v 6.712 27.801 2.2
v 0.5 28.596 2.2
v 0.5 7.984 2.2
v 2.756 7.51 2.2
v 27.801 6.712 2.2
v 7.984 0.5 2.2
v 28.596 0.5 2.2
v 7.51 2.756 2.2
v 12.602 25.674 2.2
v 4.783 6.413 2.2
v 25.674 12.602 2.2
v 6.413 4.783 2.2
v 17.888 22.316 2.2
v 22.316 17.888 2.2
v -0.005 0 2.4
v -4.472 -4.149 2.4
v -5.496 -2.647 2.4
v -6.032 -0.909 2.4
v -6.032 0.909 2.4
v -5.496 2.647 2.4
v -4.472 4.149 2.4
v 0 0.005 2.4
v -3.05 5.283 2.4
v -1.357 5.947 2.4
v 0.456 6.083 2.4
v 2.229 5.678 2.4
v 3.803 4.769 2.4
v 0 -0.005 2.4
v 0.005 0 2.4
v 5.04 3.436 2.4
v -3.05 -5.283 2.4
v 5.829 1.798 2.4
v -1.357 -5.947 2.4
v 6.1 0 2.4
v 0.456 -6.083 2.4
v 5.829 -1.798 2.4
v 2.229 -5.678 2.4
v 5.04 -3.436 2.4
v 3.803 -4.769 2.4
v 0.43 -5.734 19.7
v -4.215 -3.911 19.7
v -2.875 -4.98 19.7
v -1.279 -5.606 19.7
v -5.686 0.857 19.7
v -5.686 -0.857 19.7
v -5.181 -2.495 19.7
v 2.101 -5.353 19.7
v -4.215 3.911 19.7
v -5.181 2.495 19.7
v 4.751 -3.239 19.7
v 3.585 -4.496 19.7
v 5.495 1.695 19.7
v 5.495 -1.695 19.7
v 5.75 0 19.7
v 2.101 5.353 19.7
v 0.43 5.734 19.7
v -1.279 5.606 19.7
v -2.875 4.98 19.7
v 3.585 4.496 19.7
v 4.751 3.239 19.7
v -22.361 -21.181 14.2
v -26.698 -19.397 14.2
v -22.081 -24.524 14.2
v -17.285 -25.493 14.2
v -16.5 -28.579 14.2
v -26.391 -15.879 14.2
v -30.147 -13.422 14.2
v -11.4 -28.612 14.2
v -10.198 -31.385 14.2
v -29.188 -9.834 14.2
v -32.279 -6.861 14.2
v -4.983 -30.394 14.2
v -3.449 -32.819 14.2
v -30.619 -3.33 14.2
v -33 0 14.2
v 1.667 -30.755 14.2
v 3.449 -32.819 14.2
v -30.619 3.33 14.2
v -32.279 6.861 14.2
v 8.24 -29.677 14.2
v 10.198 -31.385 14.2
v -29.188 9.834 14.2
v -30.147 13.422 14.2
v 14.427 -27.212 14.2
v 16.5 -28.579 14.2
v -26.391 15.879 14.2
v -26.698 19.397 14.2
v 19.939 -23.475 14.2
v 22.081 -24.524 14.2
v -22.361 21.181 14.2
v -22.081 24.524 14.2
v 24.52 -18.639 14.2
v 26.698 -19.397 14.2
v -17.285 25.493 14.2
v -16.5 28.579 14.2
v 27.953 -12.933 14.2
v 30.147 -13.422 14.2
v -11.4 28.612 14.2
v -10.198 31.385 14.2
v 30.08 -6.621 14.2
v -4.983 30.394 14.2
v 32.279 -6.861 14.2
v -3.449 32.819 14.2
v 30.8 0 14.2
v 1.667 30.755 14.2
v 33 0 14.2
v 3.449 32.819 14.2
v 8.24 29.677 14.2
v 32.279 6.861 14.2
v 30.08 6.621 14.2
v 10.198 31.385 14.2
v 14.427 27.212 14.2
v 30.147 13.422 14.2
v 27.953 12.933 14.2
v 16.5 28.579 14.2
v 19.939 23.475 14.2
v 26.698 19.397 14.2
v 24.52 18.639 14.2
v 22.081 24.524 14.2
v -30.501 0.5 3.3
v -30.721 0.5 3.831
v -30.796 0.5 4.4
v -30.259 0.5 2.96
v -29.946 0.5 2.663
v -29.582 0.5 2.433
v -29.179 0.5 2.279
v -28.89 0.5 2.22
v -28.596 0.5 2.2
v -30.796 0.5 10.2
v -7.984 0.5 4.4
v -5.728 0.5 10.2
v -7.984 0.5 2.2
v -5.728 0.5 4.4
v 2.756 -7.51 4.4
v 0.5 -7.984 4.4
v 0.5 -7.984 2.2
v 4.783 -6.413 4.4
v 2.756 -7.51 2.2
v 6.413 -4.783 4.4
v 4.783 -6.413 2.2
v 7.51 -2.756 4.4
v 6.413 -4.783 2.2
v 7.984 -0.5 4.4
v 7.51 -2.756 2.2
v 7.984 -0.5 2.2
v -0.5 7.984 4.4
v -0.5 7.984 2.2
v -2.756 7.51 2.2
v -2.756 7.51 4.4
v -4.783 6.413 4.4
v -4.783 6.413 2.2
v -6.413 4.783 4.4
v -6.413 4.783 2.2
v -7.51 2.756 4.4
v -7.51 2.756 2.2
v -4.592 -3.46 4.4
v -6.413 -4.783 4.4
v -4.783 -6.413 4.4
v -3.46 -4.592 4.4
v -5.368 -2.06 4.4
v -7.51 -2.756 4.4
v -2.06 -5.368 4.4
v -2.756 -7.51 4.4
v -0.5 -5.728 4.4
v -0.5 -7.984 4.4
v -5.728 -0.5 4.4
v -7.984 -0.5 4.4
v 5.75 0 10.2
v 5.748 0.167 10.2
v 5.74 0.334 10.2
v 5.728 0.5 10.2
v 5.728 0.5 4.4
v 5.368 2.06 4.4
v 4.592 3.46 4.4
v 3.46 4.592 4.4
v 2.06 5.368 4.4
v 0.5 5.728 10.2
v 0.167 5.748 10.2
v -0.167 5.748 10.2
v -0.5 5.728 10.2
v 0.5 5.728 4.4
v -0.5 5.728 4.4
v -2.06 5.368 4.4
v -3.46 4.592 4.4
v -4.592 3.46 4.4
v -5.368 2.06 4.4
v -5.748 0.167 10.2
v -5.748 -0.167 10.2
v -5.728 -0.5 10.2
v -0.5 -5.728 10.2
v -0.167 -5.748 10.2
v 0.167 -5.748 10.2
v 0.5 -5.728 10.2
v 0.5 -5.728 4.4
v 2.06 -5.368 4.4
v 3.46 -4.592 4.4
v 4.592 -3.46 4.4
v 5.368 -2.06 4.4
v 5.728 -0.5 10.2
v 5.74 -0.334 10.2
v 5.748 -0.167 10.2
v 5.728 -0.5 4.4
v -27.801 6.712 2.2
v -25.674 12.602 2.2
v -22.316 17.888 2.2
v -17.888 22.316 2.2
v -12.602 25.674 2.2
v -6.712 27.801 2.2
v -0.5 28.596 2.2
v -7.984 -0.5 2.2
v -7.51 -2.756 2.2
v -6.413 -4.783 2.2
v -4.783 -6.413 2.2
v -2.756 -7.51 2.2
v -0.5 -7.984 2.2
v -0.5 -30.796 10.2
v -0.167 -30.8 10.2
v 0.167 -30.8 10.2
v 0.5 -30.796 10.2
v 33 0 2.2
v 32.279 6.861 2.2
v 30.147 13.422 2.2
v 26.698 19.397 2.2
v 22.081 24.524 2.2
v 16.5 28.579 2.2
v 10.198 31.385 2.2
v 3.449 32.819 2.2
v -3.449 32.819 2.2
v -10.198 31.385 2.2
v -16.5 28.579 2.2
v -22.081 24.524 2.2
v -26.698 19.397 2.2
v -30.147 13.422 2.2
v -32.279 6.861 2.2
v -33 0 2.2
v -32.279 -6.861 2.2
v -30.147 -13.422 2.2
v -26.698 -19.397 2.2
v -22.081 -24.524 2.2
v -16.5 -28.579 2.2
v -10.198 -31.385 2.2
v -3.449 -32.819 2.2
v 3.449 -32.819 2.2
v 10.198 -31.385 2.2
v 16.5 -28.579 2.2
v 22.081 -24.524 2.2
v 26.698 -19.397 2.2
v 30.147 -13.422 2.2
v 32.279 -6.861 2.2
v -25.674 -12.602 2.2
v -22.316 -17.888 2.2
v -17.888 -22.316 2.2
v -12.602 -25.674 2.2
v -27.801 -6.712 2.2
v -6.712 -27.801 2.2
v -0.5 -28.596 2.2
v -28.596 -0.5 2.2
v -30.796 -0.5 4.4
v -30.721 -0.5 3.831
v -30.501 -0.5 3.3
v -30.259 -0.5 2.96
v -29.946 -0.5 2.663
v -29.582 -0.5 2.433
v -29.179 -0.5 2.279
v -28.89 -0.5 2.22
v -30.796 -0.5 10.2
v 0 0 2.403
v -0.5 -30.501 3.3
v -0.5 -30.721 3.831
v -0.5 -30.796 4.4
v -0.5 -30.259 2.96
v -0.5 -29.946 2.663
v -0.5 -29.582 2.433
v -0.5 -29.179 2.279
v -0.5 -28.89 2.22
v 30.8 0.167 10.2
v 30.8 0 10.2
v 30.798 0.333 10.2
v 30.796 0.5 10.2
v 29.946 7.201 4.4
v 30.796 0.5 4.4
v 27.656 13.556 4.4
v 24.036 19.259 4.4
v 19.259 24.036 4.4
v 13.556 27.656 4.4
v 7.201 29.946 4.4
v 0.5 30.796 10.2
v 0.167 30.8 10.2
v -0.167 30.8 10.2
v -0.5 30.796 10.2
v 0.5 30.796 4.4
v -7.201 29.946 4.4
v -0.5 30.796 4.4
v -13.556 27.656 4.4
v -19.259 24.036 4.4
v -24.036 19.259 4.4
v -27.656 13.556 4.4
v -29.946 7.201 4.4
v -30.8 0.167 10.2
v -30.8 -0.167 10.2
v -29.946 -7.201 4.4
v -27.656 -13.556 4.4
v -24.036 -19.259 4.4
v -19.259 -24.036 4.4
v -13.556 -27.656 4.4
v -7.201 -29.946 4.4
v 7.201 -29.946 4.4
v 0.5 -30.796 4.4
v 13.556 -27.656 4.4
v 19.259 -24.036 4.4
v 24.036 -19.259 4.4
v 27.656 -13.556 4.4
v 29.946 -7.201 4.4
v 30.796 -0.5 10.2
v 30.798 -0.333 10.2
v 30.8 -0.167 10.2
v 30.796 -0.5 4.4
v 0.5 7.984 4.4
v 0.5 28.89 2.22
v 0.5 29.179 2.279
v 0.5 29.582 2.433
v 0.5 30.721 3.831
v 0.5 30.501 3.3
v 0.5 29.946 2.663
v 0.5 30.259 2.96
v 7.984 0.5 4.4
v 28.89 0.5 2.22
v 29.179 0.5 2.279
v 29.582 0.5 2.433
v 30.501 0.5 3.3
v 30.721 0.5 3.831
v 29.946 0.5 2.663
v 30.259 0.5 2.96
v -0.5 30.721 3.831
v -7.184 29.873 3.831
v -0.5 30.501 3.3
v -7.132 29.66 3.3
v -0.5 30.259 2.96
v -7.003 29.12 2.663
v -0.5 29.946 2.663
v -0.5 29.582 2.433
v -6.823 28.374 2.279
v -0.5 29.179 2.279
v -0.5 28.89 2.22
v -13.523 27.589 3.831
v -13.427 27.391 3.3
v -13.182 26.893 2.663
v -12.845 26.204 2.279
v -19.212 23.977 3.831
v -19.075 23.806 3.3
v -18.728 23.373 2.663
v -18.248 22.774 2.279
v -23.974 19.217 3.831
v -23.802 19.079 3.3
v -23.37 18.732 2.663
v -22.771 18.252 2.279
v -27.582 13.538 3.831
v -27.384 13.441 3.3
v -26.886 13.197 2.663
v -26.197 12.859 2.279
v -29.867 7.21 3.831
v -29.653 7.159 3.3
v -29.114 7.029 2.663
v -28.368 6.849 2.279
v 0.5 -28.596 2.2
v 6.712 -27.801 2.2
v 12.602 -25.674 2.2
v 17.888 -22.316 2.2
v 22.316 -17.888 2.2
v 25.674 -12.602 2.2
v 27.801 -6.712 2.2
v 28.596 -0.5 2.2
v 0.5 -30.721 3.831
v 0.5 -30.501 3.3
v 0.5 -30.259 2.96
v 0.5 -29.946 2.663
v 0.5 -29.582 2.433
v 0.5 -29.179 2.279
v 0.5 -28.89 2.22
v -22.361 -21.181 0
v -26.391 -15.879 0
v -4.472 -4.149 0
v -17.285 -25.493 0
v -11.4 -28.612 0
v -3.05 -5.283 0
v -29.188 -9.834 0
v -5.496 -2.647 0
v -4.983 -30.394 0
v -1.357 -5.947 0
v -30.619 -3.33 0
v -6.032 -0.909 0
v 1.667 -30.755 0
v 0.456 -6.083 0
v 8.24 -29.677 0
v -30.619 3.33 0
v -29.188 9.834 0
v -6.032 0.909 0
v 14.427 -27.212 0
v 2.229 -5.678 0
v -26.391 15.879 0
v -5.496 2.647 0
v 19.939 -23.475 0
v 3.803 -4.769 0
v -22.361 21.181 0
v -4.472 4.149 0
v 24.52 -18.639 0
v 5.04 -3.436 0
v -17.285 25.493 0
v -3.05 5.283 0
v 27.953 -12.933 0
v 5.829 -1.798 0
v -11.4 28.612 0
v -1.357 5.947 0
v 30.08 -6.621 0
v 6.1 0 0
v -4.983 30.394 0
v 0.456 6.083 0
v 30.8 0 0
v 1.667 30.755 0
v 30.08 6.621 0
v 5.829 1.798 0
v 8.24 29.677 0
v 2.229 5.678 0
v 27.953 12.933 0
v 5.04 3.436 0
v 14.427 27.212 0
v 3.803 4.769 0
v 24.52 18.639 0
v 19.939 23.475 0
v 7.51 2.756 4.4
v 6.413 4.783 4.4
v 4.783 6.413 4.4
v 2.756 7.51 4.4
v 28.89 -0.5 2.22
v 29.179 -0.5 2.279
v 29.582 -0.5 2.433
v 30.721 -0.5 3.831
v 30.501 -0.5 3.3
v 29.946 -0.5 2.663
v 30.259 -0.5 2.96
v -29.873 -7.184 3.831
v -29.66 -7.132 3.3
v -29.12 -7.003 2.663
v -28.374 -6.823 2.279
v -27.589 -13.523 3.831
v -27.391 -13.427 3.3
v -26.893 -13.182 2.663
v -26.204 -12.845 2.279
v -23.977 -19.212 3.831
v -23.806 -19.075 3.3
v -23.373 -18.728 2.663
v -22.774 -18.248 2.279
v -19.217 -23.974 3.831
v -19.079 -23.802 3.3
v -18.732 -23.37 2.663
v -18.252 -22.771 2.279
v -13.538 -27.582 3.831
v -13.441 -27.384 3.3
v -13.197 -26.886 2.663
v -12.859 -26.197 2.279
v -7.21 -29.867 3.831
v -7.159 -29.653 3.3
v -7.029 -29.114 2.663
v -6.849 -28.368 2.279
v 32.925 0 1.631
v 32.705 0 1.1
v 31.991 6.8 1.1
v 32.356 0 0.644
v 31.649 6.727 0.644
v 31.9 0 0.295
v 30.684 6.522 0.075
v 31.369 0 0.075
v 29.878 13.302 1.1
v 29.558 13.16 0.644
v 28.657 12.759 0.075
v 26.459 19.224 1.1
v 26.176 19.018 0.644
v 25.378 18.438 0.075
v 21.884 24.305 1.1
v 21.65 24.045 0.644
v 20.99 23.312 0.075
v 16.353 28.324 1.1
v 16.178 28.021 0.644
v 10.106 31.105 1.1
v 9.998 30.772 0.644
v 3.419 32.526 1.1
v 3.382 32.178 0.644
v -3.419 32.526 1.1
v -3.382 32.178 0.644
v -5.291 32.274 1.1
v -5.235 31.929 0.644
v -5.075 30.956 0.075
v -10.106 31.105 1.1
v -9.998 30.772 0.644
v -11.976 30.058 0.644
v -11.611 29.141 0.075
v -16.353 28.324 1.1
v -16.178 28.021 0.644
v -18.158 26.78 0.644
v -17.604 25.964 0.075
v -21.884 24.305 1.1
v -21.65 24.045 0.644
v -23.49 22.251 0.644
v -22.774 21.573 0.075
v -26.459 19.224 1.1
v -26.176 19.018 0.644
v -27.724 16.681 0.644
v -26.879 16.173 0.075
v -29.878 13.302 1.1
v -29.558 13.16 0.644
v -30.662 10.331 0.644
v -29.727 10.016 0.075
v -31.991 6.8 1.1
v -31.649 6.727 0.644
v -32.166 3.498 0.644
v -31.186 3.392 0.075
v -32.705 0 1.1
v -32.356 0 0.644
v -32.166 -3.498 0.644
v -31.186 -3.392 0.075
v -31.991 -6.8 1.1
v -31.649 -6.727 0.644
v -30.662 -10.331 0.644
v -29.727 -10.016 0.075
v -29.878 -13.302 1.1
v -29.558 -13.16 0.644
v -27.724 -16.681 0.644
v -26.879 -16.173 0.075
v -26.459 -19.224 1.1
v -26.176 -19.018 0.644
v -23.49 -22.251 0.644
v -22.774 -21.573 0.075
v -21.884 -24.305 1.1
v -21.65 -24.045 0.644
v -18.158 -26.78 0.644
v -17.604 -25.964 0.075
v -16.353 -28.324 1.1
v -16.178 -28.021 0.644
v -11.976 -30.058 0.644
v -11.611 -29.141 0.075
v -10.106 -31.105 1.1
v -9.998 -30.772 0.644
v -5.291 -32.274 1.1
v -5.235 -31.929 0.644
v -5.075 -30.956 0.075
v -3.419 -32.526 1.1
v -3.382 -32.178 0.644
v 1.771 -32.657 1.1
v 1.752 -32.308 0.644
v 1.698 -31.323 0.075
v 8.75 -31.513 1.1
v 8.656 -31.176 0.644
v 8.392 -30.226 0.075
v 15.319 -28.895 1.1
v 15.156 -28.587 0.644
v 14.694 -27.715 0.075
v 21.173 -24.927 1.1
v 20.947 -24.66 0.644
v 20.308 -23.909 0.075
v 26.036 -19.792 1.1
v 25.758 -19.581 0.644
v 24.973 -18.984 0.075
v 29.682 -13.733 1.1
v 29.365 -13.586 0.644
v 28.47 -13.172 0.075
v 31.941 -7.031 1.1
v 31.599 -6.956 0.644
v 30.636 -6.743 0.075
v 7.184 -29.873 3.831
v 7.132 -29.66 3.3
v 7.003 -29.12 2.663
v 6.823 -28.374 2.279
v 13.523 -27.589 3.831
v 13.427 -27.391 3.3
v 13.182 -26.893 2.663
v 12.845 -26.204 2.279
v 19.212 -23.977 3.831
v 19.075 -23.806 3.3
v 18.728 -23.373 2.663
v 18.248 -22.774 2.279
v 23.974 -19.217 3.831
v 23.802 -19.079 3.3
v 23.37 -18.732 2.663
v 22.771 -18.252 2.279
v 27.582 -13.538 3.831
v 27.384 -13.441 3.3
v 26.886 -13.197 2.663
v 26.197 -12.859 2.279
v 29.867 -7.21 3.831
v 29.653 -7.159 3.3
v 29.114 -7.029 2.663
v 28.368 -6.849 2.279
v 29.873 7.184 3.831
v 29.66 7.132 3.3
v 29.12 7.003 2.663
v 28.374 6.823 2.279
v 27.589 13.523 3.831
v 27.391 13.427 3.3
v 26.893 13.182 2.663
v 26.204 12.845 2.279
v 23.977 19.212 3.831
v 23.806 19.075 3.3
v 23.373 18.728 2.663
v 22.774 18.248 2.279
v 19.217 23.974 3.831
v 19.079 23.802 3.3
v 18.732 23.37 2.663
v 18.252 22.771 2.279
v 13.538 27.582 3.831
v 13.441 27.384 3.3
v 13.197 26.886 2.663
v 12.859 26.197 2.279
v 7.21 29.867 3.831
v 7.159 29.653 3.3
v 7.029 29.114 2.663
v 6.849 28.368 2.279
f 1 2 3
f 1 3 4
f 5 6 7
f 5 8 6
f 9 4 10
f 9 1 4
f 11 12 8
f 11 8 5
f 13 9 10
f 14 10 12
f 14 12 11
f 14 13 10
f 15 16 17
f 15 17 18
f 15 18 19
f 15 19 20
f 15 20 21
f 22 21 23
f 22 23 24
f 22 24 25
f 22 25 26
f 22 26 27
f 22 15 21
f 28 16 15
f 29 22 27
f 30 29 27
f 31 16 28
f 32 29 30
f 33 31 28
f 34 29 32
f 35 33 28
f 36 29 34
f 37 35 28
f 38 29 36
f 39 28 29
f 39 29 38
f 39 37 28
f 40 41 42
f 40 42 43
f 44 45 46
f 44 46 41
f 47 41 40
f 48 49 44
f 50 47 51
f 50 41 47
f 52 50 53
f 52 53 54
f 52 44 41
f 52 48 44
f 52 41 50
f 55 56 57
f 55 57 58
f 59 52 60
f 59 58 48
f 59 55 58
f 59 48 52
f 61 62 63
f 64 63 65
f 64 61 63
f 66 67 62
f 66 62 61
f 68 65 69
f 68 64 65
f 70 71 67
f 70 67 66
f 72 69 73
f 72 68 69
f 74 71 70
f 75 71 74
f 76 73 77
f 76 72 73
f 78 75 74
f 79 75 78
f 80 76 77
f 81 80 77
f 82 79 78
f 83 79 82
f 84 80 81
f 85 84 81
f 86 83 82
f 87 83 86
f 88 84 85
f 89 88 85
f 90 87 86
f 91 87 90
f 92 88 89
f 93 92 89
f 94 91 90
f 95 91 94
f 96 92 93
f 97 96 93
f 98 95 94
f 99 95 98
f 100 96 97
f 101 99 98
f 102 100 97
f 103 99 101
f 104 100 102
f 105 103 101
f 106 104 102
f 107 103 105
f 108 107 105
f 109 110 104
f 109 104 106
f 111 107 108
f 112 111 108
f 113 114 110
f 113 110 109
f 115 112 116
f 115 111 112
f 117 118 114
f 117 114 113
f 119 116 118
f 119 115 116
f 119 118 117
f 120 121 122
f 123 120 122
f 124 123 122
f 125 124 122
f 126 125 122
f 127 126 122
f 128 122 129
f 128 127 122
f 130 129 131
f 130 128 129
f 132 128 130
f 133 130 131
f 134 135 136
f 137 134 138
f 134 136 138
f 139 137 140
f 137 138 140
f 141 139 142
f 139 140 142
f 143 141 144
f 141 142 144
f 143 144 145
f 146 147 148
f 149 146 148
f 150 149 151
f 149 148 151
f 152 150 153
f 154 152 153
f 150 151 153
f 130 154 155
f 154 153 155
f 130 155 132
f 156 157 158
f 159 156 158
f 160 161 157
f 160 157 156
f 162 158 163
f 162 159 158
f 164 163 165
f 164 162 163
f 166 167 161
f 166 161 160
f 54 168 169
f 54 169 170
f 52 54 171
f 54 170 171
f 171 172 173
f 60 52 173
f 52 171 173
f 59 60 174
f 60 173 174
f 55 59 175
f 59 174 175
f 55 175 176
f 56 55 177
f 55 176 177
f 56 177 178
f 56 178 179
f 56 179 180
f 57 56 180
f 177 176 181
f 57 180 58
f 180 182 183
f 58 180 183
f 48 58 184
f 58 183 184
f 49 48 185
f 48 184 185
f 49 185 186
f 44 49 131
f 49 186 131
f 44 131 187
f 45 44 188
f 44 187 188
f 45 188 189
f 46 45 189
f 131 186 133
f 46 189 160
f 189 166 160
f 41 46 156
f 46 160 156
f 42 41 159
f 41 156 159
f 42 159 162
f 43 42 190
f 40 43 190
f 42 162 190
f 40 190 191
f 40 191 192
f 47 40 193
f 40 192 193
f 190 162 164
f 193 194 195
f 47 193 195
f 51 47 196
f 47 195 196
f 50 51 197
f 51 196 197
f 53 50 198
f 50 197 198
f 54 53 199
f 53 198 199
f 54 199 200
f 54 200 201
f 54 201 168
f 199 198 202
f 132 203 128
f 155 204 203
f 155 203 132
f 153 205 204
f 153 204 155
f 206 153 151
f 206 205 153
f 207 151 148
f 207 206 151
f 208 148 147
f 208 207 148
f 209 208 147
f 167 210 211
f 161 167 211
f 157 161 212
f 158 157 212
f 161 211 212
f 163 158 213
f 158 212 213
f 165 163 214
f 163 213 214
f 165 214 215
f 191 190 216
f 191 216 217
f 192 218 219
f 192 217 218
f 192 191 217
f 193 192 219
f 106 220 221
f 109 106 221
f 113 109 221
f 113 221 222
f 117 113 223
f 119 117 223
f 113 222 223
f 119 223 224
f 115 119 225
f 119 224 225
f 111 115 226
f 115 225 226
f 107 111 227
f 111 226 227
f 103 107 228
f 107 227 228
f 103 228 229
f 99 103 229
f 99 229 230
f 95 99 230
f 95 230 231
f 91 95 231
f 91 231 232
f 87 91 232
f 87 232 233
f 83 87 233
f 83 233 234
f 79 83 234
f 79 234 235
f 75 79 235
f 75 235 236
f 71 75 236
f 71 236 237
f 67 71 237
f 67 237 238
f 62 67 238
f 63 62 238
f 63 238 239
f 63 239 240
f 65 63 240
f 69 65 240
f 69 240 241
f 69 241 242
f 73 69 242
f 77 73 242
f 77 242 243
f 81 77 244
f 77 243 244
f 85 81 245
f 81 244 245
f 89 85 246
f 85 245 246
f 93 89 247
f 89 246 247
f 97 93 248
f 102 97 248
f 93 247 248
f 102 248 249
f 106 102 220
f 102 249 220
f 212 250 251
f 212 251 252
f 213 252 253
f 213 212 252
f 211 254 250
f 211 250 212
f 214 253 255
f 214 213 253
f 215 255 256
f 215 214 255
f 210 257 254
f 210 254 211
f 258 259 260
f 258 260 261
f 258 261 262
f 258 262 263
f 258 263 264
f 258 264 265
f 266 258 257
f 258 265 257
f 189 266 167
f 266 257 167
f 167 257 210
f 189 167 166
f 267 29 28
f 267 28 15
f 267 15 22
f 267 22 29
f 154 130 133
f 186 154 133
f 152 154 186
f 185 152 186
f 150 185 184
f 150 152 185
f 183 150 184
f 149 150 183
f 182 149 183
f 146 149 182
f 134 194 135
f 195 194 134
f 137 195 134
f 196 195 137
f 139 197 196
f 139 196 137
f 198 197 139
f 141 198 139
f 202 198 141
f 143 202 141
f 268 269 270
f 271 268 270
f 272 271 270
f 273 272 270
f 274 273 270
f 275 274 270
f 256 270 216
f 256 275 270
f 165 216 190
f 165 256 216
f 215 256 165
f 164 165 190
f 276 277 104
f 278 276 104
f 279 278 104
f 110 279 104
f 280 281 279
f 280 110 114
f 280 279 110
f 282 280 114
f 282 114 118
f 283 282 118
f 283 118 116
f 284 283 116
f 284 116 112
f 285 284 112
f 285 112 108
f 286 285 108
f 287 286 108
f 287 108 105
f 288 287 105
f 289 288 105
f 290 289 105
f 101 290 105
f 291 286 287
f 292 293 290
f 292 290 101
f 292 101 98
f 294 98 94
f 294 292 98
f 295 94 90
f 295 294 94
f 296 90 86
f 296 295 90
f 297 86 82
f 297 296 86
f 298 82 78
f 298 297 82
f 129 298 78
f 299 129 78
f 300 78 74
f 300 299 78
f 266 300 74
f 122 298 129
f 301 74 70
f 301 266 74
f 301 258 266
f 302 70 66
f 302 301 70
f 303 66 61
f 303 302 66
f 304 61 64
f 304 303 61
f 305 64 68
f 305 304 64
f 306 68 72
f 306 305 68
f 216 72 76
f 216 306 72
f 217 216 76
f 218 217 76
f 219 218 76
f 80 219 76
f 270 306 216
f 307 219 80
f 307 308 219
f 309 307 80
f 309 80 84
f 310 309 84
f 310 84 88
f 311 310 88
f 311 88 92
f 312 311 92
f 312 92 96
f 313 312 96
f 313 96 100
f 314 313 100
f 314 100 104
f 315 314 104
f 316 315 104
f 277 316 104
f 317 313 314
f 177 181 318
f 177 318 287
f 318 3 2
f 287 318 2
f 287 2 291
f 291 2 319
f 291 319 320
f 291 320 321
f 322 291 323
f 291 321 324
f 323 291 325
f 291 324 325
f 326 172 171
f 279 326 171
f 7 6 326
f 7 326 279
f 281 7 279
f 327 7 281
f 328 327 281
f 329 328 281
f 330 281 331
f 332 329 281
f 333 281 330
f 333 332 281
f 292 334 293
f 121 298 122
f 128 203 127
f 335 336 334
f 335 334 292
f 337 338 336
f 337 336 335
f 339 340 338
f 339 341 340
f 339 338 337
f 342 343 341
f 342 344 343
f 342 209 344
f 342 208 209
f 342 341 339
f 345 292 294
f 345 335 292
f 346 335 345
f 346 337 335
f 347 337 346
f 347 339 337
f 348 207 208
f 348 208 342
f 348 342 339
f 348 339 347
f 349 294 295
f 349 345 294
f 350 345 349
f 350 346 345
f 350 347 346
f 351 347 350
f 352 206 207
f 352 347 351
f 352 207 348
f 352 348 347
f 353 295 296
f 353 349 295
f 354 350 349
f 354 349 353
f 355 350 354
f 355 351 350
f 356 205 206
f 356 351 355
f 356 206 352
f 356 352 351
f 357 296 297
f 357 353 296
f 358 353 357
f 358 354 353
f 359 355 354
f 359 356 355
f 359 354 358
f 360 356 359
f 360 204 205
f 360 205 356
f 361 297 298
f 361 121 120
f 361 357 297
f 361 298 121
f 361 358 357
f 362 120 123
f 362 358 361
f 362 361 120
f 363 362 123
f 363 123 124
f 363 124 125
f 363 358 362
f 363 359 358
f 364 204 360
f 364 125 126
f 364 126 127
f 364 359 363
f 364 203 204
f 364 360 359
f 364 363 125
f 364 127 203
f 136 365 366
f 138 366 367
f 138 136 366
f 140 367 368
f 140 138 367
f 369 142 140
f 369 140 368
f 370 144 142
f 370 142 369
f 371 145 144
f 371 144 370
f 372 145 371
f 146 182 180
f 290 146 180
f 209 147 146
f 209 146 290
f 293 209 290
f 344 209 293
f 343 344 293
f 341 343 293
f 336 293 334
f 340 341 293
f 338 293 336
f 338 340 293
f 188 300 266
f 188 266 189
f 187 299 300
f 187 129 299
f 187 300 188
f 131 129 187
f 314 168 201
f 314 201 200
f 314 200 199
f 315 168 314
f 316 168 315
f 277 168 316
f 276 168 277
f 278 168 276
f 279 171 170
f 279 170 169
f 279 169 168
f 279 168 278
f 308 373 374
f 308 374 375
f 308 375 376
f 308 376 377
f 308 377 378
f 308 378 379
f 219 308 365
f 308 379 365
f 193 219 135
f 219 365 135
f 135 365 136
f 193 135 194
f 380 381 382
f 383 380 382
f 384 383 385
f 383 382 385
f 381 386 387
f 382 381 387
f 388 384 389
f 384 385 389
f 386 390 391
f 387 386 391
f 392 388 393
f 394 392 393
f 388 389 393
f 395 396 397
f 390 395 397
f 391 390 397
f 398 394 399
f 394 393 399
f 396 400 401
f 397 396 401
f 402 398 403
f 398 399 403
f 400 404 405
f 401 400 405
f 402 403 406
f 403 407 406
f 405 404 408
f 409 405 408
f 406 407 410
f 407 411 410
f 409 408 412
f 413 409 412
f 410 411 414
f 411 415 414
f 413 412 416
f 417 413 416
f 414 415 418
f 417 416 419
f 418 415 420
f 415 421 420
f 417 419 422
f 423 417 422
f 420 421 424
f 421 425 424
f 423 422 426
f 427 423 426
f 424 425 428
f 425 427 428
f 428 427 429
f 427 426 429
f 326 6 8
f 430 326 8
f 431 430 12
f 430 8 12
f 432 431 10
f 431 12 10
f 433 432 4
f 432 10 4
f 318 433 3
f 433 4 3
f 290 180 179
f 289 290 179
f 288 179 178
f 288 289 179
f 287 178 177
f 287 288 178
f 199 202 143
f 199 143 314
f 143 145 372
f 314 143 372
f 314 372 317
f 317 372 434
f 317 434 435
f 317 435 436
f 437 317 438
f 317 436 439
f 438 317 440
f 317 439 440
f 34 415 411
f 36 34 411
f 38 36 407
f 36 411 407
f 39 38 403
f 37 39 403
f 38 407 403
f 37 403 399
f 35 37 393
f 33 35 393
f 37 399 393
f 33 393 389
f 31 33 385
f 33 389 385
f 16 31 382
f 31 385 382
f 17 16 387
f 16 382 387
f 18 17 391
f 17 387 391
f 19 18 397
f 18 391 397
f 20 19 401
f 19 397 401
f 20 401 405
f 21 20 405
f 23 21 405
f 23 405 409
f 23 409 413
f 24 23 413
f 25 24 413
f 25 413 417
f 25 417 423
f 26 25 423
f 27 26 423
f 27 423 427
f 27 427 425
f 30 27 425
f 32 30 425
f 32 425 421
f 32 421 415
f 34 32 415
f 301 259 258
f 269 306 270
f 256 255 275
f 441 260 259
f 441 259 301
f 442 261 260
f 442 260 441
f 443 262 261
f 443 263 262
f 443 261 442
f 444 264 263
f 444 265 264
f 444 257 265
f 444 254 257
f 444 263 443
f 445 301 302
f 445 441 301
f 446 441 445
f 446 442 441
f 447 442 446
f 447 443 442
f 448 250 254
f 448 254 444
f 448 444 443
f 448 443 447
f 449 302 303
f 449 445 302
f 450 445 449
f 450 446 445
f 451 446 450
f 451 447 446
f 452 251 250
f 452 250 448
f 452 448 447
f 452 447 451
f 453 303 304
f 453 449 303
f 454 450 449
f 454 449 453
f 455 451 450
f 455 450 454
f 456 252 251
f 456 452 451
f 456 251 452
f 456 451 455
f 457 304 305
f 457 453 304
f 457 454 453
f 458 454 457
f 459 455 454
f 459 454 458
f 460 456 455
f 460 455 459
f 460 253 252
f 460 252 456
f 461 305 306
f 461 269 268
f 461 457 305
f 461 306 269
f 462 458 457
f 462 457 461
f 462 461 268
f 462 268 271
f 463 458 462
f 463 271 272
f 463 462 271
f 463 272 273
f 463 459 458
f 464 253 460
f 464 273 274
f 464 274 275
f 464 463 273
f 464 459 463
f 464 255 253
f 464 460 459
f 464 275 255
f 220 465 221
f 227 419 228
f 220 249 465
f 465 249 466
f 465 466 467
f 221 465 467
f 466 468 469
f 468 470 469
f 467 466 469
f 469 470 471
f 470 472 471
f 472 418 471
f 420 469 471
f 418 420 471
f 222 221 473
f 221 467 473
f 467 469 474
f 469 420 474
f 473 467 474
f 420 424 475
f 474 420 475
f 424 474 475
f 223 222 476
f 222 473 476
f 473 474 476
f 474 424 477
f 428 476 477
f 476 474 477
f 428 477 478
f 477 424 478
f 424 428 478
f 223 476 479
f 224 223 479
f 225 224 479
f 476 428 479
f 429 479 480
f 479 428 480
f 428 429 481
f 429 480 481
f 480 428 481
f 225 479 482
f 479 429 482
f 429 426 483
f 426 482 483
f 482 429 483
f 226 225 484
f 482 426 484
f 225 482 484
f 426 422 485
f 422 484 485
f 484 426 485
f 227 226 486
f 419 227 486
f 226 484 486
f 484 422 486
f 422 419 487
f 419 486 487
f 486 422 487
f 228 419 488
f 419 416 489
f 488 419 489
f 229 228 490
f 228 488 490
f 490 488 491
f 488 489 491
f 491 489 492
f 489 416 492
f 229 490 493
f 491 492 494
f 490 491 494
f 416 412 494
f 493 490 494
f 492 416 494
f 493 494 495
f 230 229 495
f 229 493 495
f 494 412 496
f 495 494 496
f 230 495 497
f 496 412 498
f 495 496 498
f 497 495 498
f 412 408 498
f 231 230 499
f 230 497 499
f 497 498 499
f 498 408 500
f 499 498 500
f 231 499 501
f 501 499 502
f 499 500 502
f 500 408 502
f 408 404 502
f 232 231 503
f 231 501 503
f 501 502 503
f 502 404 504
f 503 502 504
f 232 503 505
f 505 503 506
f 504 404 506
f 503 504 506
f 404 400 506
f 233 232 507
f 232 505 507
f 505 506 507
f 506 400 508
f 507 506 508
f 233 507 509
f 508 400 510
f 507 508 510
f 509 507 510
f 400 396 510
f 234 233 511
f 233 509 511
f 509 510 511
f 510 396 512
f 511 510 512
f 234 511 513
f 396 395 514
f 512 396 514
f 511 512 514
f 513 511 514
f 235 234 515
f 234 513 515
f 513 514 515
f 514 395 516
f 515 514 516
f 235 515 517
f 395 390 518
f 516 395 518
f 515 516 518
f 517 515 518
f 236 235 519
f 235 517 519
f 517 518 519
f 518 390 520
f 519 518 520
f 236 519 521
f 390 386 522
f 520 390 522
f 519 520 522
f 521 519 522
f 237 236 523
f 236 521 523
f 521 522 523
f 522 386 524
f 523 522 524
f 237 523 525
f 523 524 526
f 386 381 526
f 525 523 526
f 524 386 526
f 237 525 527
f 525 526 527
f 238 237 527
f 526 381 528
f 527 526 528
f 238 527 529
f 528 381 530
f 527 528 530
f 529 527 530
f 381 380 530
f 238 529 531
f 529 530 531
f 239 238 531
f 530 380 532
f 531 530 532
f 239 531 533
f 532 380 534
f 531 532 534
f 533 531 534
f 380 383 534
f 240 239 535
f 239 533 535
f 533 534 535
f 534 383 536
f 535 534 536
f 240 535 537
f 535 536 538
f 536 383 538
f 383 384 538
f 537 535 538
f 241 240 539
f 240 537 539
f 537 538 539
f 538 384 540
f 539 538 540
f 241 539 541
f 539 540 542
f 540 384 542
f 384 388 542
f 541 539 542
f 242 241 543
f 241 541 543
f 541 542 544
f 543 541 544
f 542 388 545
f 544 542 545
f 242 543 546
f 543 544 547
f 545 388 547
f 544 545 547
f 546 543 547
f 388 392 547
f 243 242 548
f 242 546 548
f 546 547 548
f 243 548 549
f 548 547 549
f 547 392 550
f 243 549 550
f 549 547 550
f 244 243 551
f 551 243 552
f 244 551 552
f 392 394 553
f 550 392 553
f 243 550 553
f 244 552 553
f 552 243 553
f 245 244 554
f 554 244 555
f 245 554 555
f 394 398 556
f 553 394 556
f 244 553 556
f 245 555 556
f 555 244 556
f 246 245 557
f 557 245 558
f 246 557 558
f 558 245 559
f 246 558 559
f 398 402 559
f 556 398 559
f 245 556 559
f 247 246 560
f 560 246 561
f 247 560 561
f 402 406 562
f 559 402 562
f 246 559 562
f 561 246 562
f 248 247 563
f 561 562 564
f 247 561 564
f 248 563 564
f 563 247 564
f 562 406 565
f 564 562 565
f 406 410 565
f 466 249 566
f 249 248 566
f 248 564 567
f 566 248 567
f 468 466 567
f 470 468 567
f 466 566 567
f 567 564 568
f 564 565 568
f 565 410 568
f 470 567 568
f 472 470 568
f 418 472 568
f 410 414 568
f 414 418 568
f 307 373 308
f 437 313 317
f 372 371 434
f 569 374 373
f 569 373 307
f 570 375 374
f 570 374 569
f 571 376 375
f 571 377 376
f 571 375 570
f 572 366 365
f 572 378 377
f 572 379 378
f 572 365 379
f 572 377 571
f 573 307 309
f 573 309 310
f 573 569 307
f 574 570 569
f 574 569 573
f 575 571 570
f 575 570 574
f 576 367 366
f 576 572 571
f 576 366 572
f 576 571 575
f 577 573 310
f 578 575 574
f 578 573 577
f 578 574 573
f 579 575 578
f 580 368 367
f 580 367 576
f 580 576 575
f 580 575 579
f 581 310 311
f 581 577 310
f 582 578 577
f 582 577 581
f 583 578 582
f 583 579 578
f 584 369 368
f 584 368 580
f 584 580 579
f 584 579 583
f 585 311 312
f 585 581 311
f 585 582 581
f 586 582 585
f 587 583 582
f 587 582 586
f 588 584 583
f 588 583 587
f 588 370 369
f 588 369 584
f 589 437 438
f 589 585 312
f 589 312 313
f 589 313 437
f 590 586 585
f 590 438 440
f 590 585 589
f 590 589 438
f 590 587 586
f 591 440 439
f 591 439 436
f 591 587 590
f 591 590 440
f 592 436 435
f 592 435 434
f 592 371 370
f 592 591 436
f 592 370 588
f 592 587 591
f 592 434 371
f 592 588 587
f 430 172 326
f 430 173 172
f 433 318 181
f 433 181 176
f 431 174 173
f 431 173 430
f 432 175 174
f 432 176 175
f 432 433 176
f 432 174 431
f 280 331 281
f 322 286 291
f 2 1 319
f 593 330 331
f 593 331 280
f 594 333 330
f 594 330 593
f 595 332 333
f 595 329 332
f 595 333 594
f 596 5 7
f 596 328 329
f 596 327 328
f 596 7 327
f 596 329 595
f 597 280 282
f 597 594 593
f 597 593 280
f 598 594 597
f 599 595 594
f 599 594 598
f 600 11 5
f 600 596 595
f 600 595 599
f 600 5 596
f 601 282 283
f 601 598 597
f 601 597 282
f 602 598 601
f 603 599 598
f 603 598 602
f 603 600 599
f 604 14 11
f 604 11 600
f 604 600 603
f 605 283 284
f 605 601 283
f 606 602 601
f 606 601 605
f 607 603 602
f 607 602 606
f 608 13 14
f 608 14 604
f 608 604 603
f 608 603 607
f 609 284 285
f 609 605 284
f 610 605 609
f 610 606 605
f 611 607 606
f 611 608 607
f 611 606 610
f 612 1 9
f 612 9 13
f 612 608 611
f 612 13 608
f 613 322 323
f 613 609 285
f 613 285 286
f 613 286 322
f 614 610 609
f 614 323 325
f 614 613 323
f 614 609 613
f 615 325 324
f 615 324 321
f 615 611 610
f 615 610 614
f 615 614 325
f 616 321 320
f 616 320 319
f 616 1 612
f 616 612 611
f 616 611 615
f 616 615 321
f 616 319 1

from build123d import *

# Parameters (mm, degrees)
F0_R            = 33
F1_DEPTH        = 2.2
F2_R            = 33
F2_R_2          = 30.8
F3_DEPTH        = 12
F4_R            = 2.2
F5_R            = 2.2
F6_R            = 8
F7_DEPTH        = 2.2
F8_R            = 5.75
F9_DEPTH        = 15.3
F10_W           = 1
F10_H           = 63
F11_DEPTH       = 8
F12_W           = 63
F12_H           = 1
F13_DEPTH       = 8
F15_D           = 0.01
F15_DEPTH       = 2.4
F15_CBORE_D     = 12.2
F15_CBORE_DEPTH = 2.4
F15_TIP         = 0.0030043031


with BuildPart() as f1:
    # F0 (on Top) → F1 (new body)
    with BuildSketch(Plane.XY):
        Circle(F0_R)
    extrude(amount=F1_DEPTH)

    # F2 (on face) → F3 (join)
    with BuildSketch(Plane.XY.offset(2.2)):
        Circle(F2_R)
        Circle(F2_R_2, mode=Mode.SUBTRACT)
    extrude(amount=F3_DEPTH)

    # F4
    f4_edges = [f1.edges().sort_by_distance(p)[0] for p in [
        (-33, 0, 0),
    ]]
    fillet(f4_edges, radius=F4_R)

    # F5
    f5_edges = [f1.edges().sort_by_distance(p)[0] for p in [
        (-30.8, 0, 2.2),
    ]]
    fillet(f5_edges, radius=F5_R)

    # F6 (on face) → F7 (join)
    with BuildSketch(Plane.XY.offset(2.2)):
        Circle(F6_R)
    extrude(amount=F7_DEPTH)

    # F8 (on face) → F9 (join)
    with BuildSketch(Plane.XY.offset(4.4)):
        Circle(F8_R)
    extrude(amount=F9_DEPTH)

    # F10 (on face) → F11 (join)
    with BuildSketch(Plane.XY.offset(2.2)):
        Rectangle(F10_W, F10_H)
    extrude(amount=F11_DEPTH)

    # F12 (on face) → F13 (join)
    with BuildSketch(Plane.XY.offset(2.2)):
        Rectangle(F12_W, F12_H)
    extrude(amount=F13_DEPTH)

    # F15
    with Locations(Plane(origin=(0, 0, 0), x_dir=(1, 0, 0), z_dir=(0, 0, -1))):
        with Locations((0, 0)):
            CounterBoreHole(F15_D / 2, F15_CBORE_D / 2, F15_CBORE_DEPTH, depth=F15_DEPTH)
            with Locations((0, 0, -(F15_DEPTH + F15_TIP / 2))):  # 118° drill point
                Cone(0, F15_D / 2, F15_TIP, mode=Mode.SUBTRACT)


solid = f1.part
